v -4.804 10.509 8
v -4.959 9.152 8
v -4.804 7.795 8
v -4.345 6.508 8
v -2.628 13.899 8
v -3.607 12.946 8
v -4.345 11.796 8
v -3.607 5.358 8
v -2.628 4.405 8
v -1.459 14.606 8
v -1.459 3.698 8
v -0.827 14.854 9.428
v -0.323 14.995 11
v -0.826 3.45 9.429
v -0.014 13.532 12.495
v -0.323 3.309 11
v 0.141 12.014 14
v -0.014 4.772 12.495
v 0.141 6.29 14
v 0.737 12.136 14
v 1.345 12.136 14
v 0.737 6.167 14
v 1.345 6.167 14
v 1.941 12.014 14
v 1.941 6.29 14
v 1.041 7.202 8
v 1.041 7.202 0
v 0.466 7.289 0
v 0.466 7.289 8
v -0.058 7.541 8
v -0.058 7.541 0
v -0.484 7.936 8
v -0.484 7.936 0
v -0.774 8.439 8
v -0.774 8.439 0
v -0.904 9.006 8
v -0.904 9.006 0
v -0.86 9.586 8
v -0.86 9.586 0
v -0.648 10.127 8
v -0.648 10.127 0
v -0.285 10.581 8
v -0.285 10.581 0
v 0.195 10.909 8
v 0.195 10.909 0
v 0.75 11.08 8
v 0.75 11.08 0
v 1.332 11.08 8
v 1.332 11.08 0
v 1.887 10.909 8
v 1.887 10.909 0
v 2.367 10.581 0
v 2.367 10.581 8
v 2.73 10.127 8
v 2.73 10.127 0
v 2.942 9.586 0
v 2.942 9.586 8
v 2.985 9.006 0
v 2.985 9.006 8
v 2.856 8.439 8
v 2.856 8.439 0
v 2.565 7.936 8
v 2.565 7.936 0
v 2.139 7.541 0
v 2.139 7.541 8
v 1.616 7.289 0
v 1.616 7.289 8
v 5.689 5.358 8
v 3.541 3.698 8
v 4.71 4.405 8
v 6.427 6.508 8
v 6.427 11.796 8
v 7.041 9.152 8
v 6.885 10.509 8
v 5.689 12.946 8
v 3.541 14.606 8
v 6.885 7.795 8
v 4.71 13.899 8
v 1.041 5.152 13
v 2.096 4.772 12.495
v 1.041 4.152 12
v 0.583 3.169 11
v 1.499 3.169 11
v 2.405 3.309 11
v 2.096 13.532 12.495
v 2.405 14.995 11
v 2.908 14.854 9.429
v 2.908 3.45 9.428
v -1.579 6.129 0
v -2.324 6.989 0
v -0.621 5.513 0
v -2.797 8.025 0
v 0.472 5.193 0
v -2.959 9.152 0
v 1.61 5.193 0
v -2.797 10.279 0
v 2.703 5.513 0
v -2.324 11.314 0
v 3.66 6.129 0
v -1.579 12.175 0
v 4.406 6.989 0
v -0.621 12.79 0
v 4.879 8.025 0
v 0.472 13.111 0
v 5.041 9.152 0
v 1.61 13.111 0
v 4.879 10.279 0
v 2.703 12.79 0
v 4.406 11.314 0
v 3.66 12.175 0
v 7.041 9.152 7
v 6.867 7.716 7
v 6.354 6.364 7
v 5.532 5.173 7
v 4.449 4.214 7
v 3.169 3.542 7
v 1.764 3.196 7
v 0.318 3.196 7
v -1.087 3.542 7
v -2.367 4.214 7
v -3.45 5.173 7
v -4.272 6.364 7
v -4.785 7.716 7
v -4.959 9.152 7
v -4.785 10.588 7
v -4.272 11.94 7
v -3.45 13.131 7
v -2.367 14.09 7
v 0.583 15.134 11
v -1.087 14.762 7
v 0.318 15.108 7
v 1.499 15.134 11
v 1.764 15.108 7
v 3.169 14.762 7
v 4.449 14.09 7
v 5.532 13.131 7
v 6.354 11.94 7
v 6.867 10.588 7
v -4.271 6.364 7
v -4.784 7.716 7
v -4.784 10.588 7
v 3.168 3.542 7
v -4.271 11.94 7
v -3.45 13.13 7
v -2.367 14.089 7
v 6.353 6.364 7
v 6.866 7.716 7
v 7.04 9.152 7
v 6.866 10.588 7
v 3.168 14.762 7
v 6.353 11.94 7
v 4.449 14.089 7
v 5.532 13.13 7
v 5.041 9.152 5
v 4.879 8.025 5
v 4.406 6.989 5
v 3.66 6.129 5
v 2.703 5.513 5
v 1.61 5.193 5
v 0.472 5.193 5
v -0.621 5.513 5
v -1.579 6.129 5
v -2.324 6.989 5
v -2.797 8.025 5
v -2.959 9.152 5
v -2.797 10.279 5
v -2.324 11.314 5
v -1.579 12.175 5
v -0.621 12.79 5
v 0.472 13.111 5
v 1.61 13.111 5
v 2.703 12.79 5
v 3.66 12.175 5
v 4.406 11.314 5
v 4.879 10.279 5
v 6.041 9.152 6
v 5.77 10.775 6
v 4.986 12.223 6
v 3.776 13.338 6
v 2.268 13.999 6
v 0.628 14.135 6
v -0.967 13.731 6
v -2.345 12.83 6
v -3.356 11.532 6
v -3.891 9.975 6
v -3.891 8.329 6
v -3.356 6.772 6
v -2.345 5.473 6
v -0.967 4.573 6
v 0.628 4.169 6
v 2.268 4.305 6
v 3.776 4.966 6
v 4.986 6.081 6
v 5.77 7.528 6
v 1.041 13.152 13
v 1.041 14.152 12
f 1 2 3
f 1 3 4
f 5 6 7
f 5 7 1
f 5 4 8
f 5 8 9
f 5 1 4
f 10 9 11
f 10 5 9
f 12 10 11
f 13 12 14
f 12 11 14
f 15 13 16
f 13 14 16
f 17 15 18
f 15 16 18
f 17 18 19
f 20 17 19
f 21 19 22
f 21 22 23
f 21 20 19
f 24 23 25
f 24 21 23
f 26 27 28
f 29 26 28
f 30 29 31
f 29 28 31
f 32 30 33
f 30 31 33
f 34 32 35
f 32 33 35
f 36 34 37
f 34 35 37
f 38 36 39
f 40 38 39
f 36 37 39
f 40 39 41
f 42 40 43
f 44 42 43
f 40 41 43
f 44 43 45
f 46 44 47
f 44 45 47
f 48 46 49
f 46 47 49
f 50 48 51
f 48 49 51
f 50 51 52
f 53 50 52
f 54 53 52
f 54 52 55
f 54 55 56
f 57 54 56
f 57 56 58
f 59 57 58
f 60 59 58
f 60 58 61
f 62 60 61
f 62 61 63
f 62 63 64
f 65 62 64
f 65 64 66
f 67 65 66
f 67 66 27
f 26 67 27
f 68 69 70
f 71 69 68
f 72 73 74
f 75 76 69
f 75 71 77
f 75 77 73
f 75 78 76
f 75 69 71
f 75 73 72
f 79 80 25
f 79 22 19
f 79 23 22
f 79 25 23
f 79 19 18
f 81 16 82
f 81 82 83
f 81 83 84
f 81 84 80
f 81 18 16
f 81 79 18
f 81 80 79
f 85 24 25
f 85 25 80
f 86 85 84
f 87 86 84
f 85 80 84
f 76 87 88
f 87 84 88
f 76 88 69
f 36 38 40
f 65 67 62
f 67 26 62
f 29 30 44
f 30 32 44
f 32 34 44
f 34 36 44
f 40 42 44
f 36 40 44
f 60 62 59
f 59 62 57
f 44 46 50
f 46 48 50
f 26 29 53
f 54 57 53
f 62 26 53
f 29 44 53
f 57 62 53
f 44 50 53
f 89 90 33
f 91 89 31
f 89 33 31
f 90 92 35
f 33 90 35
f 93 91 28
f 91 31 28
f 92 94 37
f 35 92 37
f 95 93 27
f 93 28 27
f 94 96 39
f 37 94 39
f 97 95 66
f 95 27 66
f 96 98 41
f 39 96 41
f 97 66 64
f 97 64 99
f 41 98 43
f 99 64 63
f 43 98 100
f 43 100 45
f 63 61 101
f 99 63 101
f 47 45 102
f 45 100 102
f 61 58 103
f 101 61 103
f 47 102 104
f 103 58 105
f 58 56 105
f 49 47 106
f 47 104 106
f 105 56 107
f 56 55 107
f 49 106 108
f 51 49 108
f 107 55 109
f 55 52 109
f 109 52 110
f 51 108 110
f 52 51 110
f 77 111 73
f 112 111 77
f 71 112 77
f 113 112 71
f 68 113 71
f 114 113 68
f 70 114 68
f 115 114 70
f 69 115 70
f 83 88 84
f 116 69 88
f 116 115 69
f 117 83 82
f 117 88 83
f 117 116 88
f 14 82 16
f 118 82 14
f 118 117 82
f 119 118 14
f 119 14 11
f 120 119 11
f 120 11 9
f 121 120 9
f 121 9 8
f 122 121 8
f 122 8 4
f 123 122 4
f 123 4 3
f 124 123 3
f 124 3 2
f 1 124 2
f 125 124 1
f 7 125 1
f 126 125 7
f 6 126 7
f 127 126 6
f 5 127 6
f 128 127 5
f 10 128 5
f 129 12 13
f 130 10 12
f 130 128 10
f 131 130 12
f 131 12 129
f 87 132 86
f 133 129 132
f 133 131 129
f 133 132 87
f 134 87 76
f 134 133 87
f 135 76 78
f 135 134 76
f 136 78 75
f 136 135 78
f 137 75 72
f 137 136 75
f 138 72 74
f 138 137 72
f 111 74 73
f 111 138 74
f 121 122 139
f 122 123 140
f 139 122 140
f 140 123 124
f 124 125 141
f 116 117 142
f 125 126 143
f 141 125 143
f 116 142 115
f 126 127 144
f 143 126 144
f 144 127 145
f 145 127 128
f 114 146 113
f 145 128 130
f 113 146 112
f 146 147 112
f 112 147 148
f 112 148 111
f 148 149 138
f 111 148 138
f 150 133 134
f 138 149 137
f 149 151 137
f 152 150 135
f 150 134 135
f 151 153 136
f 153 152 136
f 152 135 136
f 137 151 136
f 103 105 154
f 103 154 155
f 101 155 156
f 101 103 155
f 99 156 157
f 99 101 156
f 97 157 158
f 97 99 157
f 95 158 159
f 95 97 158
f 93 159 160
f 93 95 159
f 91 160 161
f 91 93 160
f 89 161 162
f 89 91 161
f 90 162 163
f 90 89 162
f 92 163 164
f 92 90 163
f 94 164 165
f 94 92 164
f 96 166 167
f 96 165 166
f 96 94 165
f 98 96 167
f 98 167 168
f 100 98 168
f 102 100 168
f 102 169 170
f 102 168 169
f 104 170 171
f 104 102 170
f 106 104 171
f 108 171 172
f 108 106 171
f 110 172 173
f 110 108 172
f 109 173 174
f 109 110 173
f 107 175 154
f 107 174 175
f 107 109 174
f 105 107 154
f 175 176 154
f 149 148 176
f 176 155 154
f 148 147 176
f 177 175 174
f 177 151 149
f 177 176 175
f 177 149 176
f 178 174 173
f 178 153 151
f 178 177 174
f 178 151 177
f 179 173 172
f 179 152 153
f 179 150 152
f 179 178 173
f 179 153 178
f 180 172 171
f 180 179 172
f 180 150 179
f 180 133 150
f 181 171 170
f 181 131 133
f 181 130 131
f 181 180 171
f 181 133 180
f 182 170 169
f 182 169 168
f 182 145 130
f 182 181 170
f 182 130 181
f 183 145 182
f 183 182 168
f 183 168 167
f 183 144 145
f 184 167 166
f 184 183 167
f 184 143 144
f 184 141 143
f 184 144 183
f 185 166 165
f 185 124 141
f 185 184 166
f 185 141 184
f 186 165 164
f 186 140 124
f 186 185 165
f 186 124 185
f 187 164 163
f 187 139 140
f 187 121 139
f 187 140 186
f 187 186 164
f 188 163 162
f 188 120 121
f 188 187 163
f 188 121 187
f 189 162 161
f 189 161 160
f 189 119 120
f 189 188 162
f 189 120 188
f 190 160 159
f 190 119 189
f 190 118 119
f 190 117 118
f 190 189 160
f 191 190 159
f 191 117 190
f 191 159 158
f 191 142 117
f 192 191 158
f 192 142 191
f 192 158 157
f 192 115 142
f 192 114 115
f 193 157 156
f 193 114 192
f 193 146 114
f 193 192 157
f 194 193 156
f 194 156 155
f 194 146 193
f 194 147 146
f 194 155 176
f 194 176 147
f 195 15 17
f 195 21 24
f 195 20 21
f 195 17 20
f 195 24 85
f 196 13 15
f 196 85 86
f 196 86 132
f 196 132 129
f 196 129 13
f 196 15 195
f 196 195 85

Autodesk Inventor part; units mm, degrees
ref_plane "YZ Plane" through (0, 0, 0) normal (1, 0, 0) x (0, 1, 0)
ref_plane "XY Plane" through (0, 0, 0) normal (0, 0, 1) x (1, 0, 0)
sketch "Sketch1" plane through (0, 0, 0) normal (0, 0, 1) x (1, 0, 0)
  circle A0 centre (1.0409, 9.1519) radius 2.25 projected
  circle A1 centre (1.0409, 9.1519) radius 4
  point P0 (0, 0)
  dimension "d0" = 8
extrude "Extrusion1" add sketch "Sketch1" along normal blind 1 contours A0 | A1
sketch "Sketch2" plane through (1.0409, 9.1519, 1) normal (0, 0, 1) x (1, 0, 0)
  circle A0 centre (0, 0) radius 4
  point P0 (-1.0409, -9.1519)
  dimension "d3" = 8
extrude "Extrusion2" add sketch "Sketch2" along normal blind 6
sketch "Sketch3" plane through (1.0409, 9.1519, 7) normal (0, 0, 1) x (1, 0, 0)
  circle A0 centre (0, 0) radius 6
  point P0 (-1.0409, -9.1519)
  dimension "d6" = 12
extrude "Extrusion3" add sketch "Sketch3" along normal blind 1
hole "Hole1" at (1.0409, 9.1519, 8) direction (0, 0, -1) diameter 3.9 end through all
sketch "Sketch4" plane through (1.0409, 9.1519, 8) normal (0, 0, 1) x (1, 0, 0)
  line L0 (2.5, 5.4544) -> (2.5, -5.4544)
  line L1 (-2.5, -5.4544) -> (-2.5, 5.4544)
  circle A0 centre (0, 0) radius 1.95 projected
  circle A1 centre (0, 0) radius 6 projected
  point P0 (-1.0409, -9.1519)
  dimension "d22" = 2.5
  dimension "d23" = 2.5
extrude "Extrusion4" add sketch "Sketch4" along normal blind 6 contours L0 A1 L1 | A0
ref_plane "Work Plane1" through (1.0409, 3.1519, 7) normal (0, 1, 0) x (-1, 0, 0)
sketch "Sketch5" plane through (1.0409, 3.1519, 7) normal (0, 1, 0) x (-1, 0, 0)
  line L0 (-2.5, 1) -> (-2.5, 1) projected
  line L1 (-2.5, 1) -> (-2.5, 7) projected
  line L2 (2.5, 7) -> (-2.5, 7) projected
  line L3 (2.5, 1) -> (2.5, 7) projected
  line L4 (2.5, 1) -> (2.5, 1) projected
  line L5 (2.5, 1) -> (2.5, 7) projected
  line L6 (-2.5, 7) -> (2.5, 7) projected
  line L7 (-2.5, 1) -> (-2.5, 7) projected
  line L8 (-6, 0) -> (6, 0) projected
  line L9 (6, 1) -> (2.5, 1) projected
  arc A0 (0.9, 7) -> (2.5, 1) centre (15.8796, 7.7812) ccw
  line L10 (2.5, 7) -> (-2.5, 7) projected
  line L11 (0, 7) -> (0, 0)
  line L12 (4, 0) -> (-4, 0) projected
  line L13 (-2.5, 1) -> (-6, 1) projected
  arc A1 (-2.5, 1) -> (-0.9, 7) centre (-15.8796, 7.7812) ccw
  point P0 (1.0409, -7)
  dimension "d26" = 15
  dimension "d27" = 15
  dimension "d28" = 1.8
  dimension "d29" = 1.8
extrude "Extrusion5" cut sketch "Sketch5" along normal through all
chamfer "Chamfer1" distance 3 angle 45 2 edges at (1.0409, 15.1519, 14) (1.0409, 3.1519, 14)
chamfer "Chamfer2" distance 2 angle 45 1 edges at (-2.9591, 9.1519, 7)
equation "\"d23\" = d22"
equation "\"d29\" = d28"
properties part number "Arm - 608 bearing cap"
